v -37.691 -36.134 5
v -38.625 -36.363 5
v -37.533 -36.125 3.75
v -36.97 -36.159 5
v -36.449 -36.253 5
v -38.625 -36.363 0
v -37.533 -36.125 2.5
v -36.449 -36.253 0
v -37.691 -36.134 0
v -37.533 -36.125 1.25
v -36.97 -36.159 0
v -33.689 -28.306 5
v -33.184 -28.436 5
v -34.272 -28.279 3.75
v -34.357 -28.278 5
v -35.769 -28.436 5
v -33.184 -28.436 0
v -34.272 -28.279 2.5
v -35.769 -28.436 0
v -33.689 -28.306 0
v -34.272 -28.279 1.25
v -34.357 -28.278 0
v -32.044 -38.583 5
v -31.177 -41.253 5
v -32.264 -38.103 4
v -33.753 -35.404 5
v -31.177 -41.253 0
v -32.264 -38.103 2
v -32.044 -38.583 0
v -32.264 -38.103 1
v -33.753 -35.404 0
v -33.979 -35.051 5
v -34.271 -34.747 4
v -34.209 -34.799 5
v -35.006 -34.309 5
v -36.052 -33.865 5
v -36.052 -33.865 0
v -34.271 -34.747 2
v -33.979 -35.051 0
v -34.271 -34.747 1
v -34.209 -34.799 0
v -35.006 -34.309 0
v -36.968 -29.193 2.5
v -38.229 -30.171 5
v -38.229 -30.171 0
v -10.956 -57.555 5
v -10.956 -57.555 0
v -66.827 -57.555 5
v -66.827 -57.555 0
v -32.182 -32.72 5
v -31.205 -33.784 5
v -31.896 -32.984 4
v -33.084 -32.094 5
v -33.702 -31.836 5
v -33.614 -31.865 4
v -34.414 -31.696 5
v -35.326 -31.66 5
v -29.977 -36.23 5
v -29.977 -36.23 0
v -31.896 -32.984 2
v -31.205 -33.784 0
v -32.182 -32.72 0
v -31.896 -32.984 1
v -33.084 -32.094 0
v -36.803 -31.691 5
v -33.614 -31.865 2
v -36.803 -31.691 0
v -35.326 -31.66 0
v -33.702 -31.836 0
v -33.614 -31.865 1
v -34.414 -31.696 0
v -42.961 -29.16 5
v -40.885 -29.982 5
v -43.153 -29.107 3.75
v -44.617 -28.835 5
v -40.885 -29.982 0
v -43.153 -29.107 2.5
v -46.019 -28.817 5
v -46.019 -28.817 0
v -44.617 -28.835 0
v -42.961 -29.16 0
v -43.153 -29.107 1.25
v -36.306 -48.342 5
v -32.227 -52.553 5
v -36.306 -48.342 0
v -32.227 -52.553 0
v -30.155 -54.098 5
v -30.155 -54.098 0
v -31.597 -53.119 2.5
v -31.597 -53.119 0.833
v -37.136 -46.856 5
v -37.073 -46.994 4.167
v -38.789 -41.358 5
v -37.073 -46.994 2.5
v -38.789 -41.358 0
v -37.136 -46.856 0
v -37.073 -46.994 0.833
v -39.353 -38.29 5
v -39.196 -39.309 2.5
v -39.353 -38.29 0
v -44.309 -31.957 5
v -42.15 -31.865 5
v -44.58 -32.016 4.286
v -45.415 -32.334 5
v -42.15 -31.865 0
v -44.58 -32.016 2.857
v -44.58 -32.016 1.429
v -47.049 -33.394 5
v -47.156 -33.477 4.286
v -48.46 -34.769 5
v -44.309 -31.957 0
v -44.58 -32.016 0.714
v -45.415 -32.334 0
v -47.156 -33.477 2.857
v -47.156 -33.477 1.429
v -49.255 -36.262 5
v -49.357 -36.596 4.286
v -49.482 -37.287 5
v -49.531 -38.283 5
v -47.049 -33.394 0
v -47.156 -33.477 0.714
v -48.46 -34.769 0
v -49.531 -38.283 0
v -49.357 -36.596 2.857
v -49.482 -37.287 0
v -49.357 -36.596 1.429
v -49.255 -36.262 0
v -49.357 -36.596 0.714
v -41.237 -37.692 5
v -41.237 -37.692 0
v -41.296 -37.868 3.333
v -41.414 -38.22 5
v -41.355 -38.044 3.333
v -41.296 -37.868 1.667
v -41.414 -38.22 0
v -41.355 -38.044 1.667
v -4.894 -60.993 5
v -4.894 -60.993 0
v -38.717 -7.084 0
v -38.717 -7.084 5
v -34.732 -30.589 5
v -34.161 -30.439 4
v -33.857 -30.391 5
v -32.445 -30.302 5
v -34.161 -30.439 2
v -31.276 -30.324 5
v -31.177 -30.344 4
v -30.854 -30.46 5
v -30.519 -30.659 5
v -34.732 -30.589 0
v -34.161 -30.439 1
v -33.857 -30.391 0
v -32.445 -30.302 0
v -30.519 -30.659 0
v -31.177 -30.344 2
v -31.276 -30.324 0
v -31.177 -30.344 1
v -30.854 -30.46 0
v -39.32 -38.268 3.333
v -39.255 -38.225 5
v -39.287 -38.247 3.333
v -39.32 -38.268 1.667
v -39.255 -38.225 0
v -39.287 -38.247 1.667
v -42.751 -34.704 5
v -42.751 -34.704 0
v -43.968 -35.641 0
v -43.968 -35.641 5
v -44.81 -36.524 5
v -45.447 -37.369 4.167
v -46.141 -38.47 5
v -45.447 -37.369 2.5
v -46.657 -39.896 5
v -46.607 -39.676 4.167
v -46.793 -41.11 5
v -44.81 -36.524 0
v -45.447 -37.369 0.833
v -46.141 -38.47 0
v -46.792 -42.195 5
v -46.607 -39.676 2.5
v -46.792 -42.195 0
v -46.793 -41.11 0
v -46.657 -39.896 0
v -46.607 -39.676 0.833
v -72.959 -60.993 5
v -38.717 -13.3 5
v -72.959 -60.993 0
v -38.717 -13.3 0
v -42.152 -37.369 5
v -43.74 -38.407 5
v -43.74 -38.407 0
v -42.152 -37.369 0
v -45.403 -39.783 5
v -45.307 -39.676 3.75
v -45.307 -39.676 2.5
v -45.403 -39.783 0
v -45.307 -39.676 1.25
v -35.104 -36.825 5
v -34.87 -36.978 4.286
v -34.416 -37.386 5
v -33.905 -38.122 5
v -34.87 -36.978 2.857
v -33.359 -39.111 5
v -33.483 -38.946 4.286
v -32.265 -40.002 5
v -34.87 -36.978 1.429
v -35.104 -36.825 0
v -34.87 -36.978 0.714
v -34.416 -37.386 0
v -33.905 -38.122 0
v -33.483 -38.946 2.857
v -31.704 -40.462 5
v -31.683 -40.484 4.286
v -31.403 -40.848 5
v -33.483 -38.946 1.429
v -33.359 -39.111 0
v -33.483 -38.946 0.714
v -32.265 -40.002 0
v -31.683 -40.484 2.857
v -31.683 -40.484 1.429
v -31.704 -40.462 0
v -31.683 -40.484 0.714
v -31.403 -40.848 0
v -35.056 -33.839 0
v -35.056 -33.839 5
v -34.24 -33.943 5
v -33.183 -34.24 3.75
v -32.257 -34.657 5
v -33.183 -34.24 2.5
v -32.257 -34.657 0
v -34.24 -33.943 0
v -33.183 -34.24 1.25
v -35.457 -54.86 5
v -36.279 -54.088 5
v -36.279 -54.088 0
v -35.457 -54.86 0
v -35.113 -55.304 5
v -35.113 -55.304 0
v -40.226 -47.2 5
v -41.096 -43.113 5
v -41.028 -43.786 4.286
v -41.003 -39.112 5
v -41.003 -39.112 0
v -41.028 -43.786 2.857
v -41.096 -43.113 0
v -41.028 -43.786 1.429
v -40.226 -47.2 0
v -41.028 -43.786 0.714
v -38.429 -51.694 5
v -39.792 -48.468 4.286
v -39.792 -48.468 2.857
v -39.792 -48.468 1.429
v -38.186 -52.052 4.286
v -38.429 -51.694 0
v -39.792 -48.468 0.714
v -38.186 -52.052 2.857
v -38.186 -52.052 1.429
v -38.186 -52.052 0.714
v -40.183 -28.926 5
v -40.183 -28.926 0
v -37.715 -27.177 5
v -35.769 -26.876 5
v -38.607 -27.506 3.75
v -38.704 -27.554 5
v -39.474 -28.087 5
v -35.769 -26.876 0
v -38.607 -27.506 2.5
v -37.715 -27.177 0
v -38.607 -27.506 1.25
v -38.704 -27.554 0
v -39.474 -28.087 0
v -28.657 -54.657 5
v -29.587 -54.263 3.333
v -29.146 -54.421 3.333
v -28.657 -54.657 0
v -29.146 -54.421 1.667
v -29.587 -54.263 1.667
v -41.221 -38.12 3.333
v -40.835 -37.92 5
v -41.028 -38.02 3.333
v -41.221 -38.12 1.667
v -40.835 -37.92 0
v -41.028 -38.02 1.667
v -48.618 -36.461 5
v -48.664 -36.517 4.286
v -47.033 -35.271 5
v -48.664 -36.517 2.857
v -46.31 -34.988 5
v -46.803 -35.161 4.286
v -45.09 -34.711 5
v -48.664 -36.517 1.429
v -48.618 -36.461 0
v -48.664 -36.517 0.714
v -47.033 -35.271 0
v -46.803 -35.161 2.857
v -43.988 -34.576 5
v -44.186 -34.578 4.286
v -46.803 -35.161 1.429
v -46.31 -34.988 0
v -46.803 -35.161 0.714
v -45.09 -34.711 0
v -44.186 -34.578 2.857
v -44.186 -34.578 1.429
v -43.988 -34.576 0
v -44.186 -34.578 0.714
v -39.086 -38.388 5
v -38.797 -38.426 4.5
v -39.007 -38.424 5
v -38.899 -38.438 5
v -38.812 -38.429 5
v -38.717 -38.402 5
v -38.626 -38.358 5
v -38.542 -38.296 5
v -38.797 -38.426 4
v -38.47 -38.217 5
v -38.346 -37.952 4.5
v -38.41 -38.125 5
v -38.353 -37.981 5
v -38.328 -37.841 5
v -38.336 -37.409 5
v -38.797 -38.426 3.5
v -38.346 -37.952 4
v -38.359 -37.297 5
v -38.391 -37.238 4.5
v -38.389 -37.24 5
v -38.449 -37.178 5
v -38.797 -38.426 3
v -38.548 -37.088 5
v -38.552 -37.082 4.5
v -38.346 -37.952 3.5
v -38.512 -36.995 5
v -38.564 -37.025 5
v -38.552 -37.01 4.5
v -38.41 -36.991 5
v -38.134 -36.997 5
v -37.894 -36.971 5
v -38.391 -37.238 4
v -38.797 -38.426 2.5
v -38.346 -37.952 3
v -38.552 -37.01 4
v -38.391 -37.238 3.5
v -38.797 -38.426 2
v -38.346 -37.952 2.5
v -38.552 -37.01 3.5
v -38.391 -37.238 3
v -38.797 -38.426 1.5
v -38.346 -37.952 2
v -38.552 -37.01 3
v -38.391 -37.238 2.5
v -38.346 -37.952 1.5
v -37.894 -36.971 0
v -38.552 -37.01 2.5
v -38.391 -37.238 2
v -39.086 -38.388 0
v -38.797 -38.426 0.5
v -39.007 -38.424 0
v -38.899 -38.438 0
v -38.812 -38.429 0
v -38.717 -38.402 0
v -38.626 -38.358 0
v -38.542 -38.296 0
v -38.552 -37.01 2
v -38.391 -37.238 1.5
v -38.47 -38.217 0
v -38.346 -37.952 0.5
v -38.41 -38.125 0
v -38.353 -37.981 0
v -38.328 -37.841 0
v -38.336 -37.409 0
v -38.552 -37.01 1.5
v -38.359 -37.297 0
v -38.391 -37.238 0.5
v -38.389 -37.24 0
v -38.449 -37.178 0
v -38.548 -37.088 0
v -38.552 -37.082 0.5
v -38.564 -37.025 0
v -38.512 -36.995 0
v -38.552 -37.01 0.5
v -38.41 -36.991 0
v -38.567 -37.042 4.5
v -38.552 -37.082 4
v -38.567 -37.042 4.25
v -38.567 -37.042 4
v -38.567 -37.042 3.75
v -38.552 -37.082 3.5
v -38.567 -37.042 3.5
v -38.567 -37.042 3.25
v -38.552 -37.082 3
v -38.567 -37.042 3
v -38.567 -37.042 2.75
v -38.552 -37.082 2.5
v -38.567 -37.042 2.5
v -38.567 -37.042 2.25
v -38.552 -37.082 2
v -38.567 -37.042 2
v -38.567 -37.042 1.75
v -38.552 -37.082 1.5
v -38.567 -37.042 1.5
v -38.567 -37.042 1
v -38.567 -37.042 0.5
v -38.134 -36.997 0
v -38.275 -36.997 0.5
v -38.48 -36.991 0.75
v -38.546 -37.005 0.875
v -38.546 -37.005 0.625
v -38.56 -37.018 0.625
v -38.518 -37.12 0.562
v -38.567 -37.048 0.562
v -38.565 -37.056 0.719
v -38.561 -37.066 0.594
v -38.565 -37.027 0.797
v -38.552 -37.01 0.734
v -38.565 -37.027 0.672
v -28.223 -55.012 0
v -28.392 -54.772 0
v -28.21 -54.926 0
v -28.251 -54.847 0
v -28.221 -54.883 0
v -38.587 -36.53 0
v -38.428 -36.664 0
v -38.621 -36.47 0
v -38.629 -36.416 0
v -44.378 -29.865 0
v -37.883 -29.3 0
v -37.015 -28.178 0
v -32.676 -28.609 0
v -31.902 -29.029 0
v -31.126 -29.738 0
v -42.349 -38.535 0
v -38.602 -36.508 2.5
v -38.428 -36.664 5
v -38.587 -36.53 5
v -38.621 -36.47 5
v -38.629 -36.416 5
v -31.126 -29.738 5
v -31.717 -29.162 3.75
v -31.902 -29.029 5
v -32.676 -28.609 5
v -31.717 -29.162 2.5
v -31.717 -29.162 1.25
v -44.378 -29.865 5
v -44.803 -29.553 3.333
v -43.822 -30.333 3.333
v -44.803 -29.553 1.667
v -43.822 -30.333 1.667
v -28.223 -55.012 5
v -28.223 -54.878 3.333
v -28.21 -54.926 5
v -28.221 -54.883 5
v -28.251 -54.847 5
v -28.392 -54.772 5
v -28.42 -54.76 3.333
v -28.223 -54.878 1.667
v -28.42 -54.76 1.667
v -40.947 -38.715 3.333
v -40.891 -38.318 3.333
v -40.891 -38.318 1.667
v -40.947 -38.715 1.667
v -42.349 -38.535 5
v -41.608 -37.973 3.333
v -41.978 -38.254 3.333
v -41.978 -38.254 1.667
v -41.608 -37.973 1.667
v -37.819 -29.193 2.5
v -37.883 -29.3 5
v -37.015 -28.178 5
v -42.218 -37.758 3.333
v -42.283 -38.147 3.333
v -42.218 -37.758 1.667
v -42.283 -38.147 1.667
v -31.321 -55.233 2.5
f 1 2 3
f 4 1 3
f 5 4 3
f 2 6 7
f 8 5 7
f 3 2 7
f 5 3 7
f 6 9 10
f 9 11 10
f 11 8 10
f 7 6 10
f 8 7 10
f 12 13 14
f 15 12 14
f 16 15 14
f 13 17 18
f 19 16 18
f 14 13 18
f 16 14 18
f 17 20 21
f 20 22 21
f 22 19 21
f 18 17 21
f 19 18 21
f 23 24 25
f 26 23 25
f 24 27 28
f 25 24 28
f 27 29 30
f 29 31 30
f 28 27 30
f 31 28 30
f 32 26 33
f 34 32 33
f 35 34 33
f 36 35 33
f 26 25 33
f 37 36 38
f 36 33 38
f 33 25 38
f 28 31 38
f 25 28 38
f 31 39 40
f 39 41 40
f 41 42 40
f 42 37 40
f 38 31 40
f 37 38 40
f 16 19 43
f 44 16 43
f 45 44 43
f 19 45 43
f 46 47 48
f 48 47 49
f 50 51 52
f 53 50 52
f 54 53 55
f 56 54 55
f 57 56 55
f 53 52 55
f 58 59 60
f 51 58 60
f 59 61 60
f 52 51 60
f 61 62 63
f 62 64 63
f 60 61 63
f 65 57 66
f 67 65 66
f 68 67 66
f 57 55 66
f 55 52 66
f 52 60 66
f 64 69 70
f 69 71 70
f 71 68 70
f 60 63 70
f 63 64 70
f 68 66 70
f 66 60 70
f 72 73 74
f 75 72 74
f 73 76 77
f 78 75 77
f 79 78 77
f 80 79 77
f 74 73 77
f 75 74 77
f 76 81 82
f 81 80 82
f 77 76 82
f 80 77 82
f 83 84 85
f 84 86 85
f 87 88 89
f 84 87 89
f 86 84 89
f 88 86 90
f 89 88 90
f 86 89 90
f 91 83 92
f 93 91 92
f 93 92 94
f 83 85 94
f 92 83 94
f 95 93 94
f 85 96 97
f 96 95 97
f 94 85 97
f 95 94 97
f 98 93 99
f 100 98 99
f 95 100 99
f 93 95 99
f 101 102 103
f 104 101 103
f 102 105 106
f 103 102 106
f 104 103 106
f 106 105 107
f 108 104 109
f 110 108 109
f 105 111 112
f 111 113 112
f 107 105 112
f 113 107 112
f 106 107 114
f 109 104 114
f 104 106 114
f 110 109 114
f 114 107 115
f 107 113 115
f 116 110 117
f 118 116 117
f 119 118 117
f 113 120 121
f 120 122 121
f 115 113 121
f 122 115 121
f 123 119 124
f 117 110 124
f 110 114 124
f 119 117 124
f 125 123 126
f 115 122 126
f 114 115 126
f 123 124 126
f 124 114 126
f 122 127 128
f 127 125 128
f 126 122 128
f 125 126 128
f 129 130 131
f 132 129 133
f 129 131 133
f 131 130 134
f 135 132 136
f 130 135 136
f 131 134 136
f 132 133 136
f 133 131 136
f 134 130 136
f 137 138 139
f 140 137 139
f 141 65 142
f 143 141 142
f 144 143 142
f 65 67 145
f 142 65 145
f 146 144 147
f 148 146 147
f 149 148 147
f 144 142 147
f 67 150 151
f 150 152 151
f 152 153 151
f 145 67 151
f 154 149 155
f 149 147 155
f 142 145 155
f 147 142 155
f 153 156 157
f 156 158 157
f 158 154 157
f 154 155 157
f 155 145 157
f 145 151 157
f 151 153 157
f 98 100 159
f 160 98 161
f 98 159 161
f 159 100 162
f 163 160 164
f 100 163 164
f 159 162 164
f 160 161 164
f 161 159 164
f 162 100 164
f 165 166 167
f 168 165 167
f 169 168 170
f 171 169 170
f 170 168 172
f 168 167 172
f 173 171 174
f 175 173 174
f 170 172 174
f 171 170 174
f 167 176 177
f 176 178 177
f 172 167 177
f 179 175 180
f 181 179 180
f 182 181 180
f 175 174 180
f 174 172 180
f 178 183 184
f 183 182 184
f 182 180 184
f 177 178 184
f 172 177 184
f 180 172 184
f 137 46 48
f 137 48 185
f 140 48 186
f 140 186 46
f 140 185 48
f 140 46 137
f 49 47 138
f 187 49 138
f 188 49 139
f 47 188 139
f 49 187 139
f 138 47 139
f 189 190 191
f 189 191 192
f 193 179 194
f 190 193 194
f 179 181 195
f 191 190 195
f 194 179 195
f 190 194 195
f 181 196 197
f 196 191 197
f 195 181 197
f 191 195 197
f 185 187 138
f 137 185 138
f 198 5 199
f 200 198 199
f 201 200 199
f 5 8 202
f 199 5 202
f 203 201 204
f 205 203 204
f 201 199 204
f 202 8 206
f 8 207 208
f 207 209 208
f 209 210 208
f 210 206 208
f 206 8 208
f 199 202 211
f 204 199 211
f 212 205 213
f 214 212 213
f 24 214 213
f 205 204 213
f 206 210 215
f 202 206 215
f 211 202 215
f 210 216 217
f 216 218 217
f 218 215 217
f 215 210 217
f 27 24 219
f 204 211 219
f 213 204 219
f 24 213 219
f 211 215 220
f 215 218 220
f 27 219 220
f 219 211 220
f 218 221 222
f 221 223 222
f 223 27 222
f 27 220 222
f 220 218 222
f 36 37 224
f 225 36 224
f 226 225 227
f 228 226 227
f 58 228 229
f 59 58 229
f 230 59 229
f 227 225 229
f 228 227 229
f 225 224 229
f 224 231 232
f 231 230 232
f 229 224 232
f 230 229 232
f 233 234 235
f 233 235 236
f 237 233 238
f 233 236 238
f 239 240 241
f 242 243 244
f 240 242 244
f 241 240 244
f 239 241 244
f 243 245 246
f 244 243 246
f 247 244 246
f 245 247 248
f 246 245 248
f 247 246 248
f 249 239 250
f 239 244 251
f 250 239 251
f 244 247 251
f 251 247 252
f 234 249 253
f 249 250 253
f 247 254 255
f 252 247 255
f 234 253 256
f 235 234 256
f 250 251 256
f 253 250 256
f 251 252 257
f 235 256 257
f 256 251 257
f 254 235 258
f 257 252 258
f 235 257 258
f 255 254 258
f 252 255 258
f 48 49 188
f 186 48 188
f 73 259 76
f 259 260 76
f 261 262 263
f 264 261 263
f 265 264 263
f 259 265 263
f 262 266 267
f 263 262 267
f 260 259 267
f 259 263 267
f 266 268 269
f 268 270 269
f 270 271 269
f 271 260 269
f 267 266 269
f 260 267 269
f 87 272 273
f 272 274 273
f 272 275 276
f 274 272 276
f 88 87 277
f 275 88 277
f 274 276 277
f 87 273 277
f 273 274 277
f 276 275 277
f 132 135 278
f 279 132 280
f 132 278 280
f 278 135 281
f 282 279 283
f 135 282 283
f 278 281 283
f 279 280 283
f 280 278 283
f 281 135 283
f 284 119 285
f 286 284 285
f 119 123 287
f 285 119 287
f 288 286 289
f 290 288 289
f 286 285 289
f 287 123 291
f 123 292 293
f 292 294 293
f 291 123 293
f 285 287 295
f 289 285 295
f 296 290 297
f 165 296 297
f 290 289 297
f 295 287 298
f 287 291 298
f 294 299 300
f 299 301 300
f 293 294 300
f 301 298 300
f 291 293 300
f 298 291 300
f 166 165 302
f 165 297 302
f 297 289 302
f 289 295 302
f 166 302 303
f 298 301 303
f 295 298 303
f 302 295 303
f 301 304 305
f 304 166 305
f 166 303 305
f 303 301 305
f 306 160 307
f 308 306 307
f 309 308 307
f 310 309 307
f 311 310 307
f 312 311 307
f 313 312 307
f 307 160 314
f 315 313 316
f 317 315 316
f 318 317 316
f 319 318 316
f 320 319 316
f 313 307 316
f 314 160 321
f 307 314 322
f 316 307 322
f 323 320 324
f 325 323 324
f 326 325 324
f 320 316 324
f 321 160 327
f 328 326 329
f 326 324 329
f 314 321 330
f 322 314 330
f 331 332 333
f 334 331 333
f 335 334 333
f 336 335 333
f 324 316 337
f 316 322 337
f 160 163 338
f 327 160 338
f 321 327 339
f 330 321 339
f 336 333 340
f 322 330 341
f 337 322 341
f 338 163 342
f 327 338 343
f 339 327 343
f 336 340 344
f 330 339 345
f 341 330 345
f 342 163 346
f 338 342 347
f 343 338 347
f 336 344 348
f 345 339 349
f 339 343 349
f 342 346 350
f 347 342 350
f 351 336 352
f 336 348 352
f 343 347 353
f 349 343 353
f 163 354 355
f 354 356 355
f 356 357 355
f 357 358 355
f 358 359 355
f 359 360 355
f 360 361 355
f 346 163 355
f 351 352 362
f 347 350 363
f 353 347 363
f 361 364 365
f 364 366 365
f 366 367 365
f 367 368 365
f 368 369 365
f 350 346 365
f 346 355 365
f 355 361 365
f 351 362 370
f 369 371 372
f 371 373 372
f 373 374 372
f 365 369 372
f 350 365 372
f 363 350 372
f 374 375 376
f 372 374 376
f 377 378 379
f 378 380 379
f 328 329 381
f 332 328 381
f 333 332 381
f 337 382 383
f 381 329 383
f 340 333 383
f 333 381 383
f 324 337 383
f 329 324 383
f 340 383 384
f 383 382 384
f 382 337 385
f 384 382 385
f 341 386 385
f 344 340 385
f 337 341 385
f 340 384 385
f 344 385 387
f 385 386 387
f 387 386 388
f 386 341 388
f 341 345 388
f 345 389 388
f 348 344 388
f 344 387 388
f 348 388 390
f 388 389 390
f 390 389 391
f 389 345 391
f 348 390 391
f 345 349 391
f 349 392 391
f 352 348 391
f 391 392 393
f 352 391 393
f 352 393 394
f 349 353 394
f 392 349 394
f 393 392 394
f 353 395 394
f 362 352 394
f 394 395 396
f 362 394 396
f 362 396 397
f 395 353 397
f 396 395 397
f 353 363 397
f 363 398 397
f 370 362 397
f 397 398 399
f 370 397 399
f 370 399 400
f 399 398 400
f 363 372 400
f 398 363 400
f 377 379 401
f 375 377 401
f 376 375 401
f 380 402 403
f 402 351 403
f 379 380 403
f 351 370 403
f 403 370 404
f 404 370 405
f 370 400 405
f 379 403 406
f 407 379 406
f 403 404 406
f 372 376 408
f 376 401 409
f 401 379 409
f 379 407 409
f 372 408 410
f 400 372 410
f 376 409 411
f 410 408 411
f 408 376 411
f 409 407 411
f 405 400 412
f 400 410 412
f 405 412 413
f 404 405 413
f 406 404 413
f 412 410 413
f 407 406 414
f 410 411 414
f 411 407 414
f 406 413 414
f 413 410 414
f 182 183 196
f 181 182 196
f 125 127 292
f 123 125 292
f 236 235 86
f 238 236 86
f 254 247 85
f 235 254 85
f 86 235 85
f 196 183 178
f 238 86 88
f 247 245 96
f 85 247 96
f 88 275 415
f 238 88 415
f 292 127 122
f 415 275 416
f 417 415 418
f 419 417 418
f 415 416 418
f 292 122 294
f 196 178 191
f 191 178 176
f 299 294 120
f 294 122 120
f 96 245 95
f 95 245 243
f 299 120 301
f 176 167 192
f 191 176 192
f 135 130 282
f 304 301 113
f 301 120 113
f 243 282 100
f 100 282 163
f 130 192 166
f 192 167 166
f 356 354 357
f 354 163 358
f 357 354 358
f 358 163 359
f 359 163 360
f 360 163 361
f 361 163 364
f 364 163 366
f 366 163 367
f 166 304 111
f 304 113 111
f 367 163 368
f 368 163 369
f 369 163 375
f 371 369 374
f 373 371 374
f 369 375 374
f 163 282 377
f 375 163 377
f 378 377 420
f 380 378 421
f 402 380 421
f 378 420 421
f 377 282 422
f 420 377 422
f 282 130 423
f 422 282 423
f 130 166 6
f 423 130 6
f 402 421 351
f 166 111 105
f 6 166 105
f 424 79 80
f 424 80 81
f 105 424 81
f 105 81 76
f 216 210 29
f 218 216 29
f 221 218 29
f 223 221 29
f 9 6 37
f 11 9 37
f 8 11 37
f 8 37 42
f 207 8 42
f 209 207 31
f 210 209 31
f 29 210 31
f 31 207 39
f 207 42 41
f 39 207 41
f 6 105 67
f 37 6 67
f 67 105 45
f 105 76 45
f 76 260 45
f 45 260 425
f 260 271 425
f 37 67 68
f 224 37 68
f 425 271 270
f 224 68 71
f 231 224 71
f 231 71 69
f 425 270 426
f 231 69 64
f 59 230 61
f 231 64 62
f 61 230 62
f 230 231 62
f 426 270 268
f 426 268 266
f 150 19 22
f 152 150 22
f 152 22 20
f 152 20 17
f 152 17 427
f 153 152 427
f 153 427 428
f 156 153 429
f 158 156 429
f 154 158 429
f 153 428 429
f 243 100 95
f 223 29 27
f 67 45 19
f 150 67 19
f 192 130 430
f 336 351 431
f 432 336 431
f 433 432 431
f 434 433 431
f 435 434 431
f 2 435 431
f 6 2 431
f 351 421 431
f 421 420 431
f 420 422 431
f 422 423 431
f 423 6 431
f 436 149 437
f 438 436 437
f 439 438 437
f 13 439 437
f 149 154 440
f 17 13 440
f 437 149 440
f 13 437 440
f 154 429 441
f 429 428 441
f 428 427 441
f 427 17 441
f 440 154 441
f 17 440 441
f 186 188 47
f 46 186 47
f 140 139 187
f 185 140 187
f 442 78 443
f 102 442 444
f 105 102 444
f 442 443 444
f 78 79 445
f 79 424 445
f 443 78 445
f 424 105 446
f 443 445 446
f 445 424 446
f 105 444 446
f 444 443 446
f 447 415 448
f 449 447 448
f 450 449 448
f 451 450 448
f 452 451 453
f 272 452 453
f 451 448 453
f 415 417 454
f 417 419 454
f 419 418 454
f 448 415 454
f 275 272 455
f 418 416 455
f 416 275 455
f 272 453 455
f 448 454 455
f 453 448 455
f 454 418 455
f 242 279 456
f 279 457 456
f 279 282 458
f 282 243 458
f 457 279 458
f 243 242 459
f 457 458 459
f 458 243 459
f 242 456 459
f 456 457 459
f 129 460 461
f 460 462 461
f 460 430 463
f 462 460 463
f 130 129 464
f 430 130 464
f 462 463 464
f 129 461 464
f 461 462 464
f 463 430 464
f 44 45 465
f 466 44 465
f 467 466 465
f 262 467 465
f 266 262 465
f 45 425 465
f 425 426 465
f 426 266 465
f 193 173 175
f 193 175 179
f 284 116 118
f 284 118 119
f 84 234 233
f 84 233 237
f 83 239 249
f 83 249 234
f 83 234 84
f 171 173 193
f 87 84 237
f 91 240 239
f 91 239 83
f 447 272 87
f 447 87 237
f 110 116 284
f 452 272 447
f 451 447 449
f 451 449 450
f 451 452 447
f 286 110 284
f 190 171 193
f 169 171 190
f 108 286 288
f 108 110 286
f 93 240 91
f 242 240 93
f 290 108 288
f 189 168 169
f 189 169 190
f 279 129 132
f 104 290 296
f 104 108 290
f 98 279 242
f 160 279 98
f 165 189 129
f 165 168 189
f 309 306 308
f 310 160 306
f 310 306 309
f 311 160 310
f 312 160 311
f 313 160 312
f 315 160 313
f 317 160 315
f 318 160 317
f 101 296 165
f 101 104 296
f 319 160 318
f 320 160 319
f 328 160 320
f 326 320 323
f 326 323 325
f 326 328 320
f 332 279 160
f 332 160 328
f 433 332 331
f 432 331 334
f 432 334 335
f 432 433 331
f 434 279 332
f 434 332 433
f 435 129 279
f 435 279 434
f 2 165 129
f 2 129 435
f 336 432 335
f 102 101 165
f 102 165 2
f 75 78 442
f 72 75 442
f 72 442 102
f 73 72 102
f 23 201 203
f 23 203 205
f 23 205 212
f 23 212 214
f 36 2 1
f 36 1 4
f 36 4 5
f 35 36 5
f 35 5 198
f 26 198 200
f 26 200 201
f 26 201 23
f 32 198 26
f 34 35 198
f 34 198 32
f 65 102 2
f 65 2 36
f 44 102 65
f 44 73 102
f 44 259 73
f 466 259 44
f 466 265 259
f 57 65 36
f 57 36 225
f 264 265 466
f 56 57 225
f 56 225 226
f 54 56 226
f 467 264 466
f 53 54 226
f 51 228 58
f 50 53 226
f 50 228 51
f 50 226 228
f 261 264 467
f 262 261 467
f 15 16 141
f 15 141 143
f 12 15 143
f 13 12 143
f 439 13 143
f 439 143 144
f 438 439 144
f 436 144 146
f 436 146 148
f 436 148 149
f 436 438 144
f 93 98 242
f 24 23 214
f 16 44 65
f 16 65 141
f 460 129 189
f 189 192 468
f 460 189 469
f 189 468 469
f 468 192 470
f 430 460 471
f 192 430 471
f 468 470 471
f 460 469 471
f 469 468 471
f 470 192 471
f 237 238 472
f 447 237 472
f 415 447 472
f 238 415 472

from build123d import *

# Parameters (mm, degrees)
F1_DEPTH = 5


with BuildPart() as f1:
    # F0 (on Top) → F1 (new body)
    with BuildSketch(Plane.XY):
        Polygon((-4.8942267895, -60.9930977225), (-38.7174151838, -7.0840450935), (-72.9591697454, -60.9930977225), align=None)
        Polygon((-66.8270720302, -57.5545028058), (-38.7174151838, -13.2996160537), (-10.9559586272, -57.5545028058), align=None, mode=Mode.SUBTRACT)
    extrude(amount=F1_DEPTH)


with BuildPart() as f1b:
    # F0 (on Top) → F1, piece 2 (new body)
    with BuildSketch(Plane.XY):
        with BuildLine():
            add(Edge.make_bspline(
                [(-41.0026013851, -39.1123108566), (-41.0724070062, -39.5084117403), (-41.2503673588, -40.5182194307), (-41.1072732868, -43.8480663355), (-40.5890359944, -46.2532768009), (-39.7348674665, -48.5226430333), (-38.6642597215, -52.168707541), (-35.4769859375, -54.7224372445), (-35.1926582325, -55.176880492), (-35.1131930947, -55.3038902581)],
                knots=[0, 0, 0, 0, 0.1084280006, 0.2764230866, 0.4227170343, 0.5641008624, 0.7471372156, 0.9293288144, 1, 1, 1, 1], degree=3))
            add(Edge.make_bspline(
                [(-35.1131930947, -55.3038902581), (-33.8170327867, -55.2953728987), (-31.3478825499, -55.2791475602), (-29.2296279697, -55.0981834183), (-28.2233338803, -55.0122149289)],
                knots=[0, 0, 0, 0, 0.524941856, 1, 1, 1, 1], degree=3))
            add(Edge.make_bspline(
                [(-28.2233338803, -55.0122149289), (-28.2120480712, -54.9644639355), (-28.1859826933, -54.8541796239), (-28.4333094971, -54.7565506125), (-28.5809646725, -54.6911244521), (-28.6569073796, -54.6574741602)],
                knots=[0, 0, 0, 0, 0.2705340607, 0.6248176327, 1, 1, 1, 1], degree=3))
            add(Edge.make_bspline(
                [(-28.6569073796, -54.6574741602), (-28.822558529, -54.572762208), (-29.1421269682, -54.4093388545), (-29.5875229688, -54.2586980753), (-29.958474715, -54.1534473369), (-30.1547013223, -54.0977716446)],
                knots=[0, 0, 0, 0, 0.336397641, 0.6489666356, 1, 1, 1, 1], degree=3))
            add(Edge.make_bspline(
                [(-30.1547013223, -54.0977716446), (-30.3576729356, -53.9766530949), (-30.8055213578, -53.7094100529), (-31.7024352102, -53.1155011428), (-34.4858232768, -50.3278142701), (-37.5163353016, -47.558617296), (-39.1587519986, -39.7237280146), (-39.3083895188, -38.6166635917), (-39.3525436521, -38.2899977267)],
                knots=[0, 0, 0, 0, 0.0856596175, 0.1890043831, 0.3843409229, 0.6009414698, 0.8822482258, 1, 1, 1, 1], degree=3))
            add(Edge.make_bspline(
                [(-39.3525436521, -38.2899977267), (-39.3198666473, -38.2683215042), (-39.2871896426, -38.2466452817), (-39.2545126379, -38.2249690592)],
                knots=[0, 0, 0, 0, 0.1176384603, 0.1176384603, 0.1176384603, 0.1176384603], degree=3))
            add(Edge.make_bspline(
                [(-39.2545126379, -38.2249690592), (-39.1908127264, -38.2987175983), (-39.0663572649, -38.4428058437), (-38.7877097979, -38.4454227065), (-38.5078418773, -38.3116425574), (-38.3023927112, -37.9598611697), (-38.3282136337, -37.5027189579), (-38.3461248518, -37.2263149736), (-38.5665753787, -37.1049484623), (-38.578159471, -36.9666577611), (-38.2115435015, -37.0163962906), (-38.0019412341, -36.9862398134), (-37.8944054246, -36.9707681239)],
                knots=[0, 0, 0, 0, 0.0996849828, 0.1947622886, 0.2977582915, 0.4158220184, 0.544066571, 0.6414311906, 0.7313188166, 0.7823642723, 0.888342648, 1, 1, 1, 1], degree=3))
            add(Edge.make_bspline(
                [(-37.8944054246, -36.9707681239), (-38.2073795941, -36.8030629528), (-38.650675779, -36.5655255783), (-38.6305469371, -36.409152052), (-38.6246293783, -36.3631807268)],
                knots=[0, 0, 0, 0, 0.7060159329, 1, 1, 1, 1], degree=3))
            add(Edge.make_bspline(
                [(-38.6246293783, -36.3631807268), (-38.4849049714, -36.3141084847), (-38.1781527262, -36.2063748342), (-37.5405478199, -36.0882227676), (-36.8118881126, -36.1734927248), (-36.5547259557, -36.2300668999), (-36.4486798644, -36.2533964217)],
                knots=[0, 0, 0, 0, 0.230440296, 0.5059107408, 0.7962521573, 1, 1, 1, 1], degree=3))
            add(Edge.make_bspline(
                [(-36.4486798644, -36.2533964217), (-36.230144403, -36.3329785924), (-35.7530358709, -36.506723084), (-34.8110295609, -36.9163430156), (-33.9320374932, -37.8901471533), (-33.5667620954, -39.0056076716), (-32.7161382724, -39.7134959075), (-31.6174020131, -40.4135736361), (-31.3153792771, -40.9888215325), (-31.1768669635, -41.2526391447)],
                knots=[0, 0, 0, 0, 0.1183072105, 0.2582893374, 0.4159812625, 0.5643846735, 0.7092975277, 0.866679335, 1, 1, 1, 1], degree=3))
            add(Edge.make_bspline(
                [(-31.1768669635, -41.2526391447), (-31.2424013905, -40.9563467049), (-31.4077828418, -40.2086286581), (-32.1791337489, -38.0614619444), (-33.6042914479, -35.7171792287), (-34.1481555554, -34.6273319771), (-35.362614441, -34.1412148898), (-36.051698029, -33.8653922081)],
                knots=[0, 0, 0, 0, 0.1501643802, 0.3789520149, 0.6278420769, 0.788837712, 1, 1, 1, 1], degree=3))
            add(Edge.make_bspline(
                [(-36.051698029, -33.8653922081), (-35.6220260781, -33.8384813819), (-34.7238758966, -33.7822292496), (-33.136303993, -34.2170801435), (-31.9897469899, -34.7470101466), (-30.7199102783, -35.6826239887), (-29.9769081175, -36.2300668999)],
                knots=[0, 0, 0, 0, 0.2251637888, 0.4706634849, 0.6902765758, 1, 1, 1, 1], degree=3))
            add(Edge.make_bspline(
                [(-29.9769081175, -36.2300668999), (-30.1970530014, -35.6659379513), (-30.6459974471, -34.5155021401), (-31.807007287, -32.9122669106), (-33.5389017245, -31.6831385005), (-35.3541587103, -31.6458158581), (-36.3363834177, -31.6765968518), (-36.8026420474, -31.6912084818)],
                knots=[0, 0, 0, 0, 0.2011937629, 0.4102971676, 0.6236112069, 0.8213295577, 1, 1, 1, 1], degree=3))
            add(Edge.make_bspline(
                [(-36.8026420474, -31.6912084818), (-36.3397131577, -31.3987198187), (-35.4538200467, -30.8389930497), (-34.1672406782, -30.3621352408), (-32.6997385584, -30.3239225616), (-31.1749366514, -30.2282716001), (-30.7105184271, -30.5336368053), (-30.5192302912, -30.6594129652)],
                knots=[0, 0, 0, 0, 0.2211686772, 0.4232438542, 0.6375576759, 0.8507144791, 1, 1, 1, 1], degree=3))
            add(Edge.make_bspline(
                [(-30.5192302912, -30.6594129652), (-30.6249670161, -30.4687622554), (-30.870670919, -30.0257409348), (-31.6413690235, -29.0999595681), (-32.75671191, -28.5505210034), (-33.069021354, -28.4670336931), (-33.1837274134, -28.436370194)],
                knots=[0, 0, 0, 0, 0.2264112876, 0.5261193506, 0.8259515266, 1, 1, 1, 1], degree=3))
            add(Edge.make_bspline(
                [(-33.1837274134, -28.436370194), (-33.3333450989, -28.3866040351), (-33.6507585315, -28.281025291), (-34.2869970801, -28.2790731396), (-34.8178161453, -28.2748926944), (-35.4224490645, -28.3774953921), (-35.7693955302, -28.436370194)],
                knots=[0, 0, 0, 0, 0.2184642057, 0.4634711008, 0.6921325329, 1, 1, 1, 1], degree=3))
            add(Edge.make_bspline(
                [(-35.7693955302, -28.436370194), (-36.169582599, -28.6753343626), (-36.9944163729, -29.167868311), (-37.8093717358, -29.8298516834), (-38.2289327681, -30.1706586033)],
                knots=[0, 0, 0, 0, 0.4851729905, 1, 1, 1, 1], degree=3))
            add(Edge.make_bspline(
                [(-38.2289327681, -30.1706586033), (-38.140889795, -29.8681477255), (-37.9024285783, -29.0488079246), (-36.5944508944, -27.7161391397), (-35.7693955302, -26.8755089492)],
                knots=[0, 0, 0, 0, 0.3692129657, 1, 1, 1, 1], degree=3))
            add(Edge.make_bspline(
                [(-35.7693955302, -26.8755089492), (-36.1788971818, -26.9033059777), (-37.0504117258, -26.9624645051), (-38.6637951228, -27.4416283681), (-39.7640036754, -28.2366170272), (-40.4845920584, -29.3586245563), (-40.8846661448, -29.9815684557)],
                knots=[0, 0, 0, 0, 0.226439907, 0.4819166699, 0.712357679, 1, 1, 1, 1], degree=3))
            add(Edge.make_bspline(
                [(-40.8846661448, -29.9815684557), (-41.1082662493, -29.8685961526), (-41.645568628, -29.5971280899), (-43.1586380708, -29.0508301388), (-44.8123994469, -28.7689664398), (-45.6419446013, -28.8018067107), (-46.0186190903, -28.8167186081)],
                knots=[0, 0, 0, 0, 0.1981701515, 0.4761951882, 0.7621541048, 1, 1, 1, 1], degree=3))
            add(Edge.make_bspline(
                [(-46.0186190903, -28.8167186081), (-45.5926865296, -29.0607524025), (-44.7666380578, -29.5340286003), (-43.7914014061, -30.33857764), (-42.7483597259, -31.3083929975), (-42.1501137316, -31.8646393716)],
                knots=[0, 0, 0, 0, 0.3122213578, 0.605518336, 1, 1, 1, 1], degree=3))
            add(Edge.make_bspline(
                [(-42.1501137316, -31.8646393716), (-42.5951422734, -31.8543130797), (-43.4517359463, -31.8344369695), (-44.607503871, -31.9743175169), (-45.6339055514, -32.3934663765), (-47.2203752291, -33.4679618052), (-48.5352296377, -34.6749356831), (-49.4975537331, -36.5658591161), (-49.5200170297, -37.7284929974), (-49.5307333767, -38.2831394672)],
                knots=[0, 0, 0, 0, 0.1316946884, 0.2534867459, 0.373646316, 0.5310788366, 0.686567004, 0.8504735605, 1, 1, 1, 1], degree=3))
            add(Edge.make_bspline(
                [(-49.5307333767, -38.2831394672), (-49.4020244938, -37.9863592532), (-49.1441850058, -37.3918264073), (-48.7142748049, -36.4611101395), (-47.9766283249, -35.8904139933), (-46.8393997259, -35.0502654215), (-45.348542974, -34.7802965947), (-44.1922520478, -34.4963948825), (-43.247133627, -34.6326890368), (-42.7512414753, -34.7042009234)],
                knots=[0, 0, 0, 0, 0.1297334578, 0.2598919948, 0.3851829775, 0.5398895171, 0.7004509751, 0.8428302663, 1, 1, 1, 1], degree=3))
            add(Edge.make_bspline(
                [(-42.7512414753, -34.7042009234), (-43.2749571176, -35.0793444426), (-44.3130104475, -35.8229139445), (-45.4513706422, -37.3535222555), (-46.137990524, -38.3766014167), (-46.6760747583, -39.6597760724), (-46.8178240534, -41.0719798225), (-46.8004988767, -41.8361241029), (-46.79235816, -42.1951785684)],
                knots=[0, 0, 0, 0, 0.1912311339, 0.3790379727, 0.5315061964, 0.6916690353, 0.8551221117, 1, 1, 1, 1], degree=3))
            add(Edge.make_bspline(
                [(-46.79235816, -42.1951785684), (-46.6052192274, -41.8117017923), (-46.2091887212, -41.0001736959), (-45.4091383303, -39.5686546838), (-43.560705958, -38.2668950141), (-42.5985693675, -37.653816224), (-42.152132839, -37.3693443835)],
                knots=[0, 0, 0, 0, 0.2193282639, 0.46415079, 0.751363098, 1, 1, 1, 1], degree=3))
            add(Edge.make_bspline(
                [(-42.152132839, -37.3693443835), (-42.2176296512, -37.757979085), (-42.2831264635, -38.1466137866), (-42.3486232758, -38.5352484882)],
                knots=[0, 0, 0, 0, 1.1823454965, 1.1823454965, 1.1823454965, 1.1823454965], degree=3))
            add(Edge.make_bspline(
                [(-42.3486232758, -38.5352484882), (-41.9781158368, -38.2540834447), (-41.6076083978, -37.9729184012), (-41.2371009588, -37.6917533576)],
                knots=[0, 0, 0, 0, 1.3953371981, 1.3953371981, 1.3953371981, 1.3953371981], degree=3))
            add(Edge.make_bspline(
                [(-41.2371009588, -37.6917533576), (-41.2962250412, -37.8678093354), (-41.3553491235, -38.0438653131), (-41.4144732058, -38.2199212909)],
                knots=[0, 0, 0, 0, 0.5571555256, 0.5571555256, 0.5571555256, 0.5571555256], degree=3))
            add(Edge.make_bspline(
                [(-41.4144732058, -38.2199212909), (-41.2213355303, -38.1200686097), (-41.0281978548, -38.0202159286), (-40.8350601792, -37.9203632474)],
                knots=[0, 0, 0, 0, 0.6522687152, 0.6522687152, 0.6522687152, 0.6522687152], degree=3))
            add(Edge.make_bspline(
                [(-40.8350601792, -37.9203632474), (-40.8909072479, -38.3176791171), (-40.9467543165, -38.7149949869), (-41.0026013851, -39.1123108566)],
                knots=[0, 0, 0, 0, 1.2036648864, 1.2036648864, 1.2036648864, 1.2036648864], degree=3))
        make_face()
    extrude(amount=F1_DEPTH)


solid = Compound([f1.part, f1b.part])
